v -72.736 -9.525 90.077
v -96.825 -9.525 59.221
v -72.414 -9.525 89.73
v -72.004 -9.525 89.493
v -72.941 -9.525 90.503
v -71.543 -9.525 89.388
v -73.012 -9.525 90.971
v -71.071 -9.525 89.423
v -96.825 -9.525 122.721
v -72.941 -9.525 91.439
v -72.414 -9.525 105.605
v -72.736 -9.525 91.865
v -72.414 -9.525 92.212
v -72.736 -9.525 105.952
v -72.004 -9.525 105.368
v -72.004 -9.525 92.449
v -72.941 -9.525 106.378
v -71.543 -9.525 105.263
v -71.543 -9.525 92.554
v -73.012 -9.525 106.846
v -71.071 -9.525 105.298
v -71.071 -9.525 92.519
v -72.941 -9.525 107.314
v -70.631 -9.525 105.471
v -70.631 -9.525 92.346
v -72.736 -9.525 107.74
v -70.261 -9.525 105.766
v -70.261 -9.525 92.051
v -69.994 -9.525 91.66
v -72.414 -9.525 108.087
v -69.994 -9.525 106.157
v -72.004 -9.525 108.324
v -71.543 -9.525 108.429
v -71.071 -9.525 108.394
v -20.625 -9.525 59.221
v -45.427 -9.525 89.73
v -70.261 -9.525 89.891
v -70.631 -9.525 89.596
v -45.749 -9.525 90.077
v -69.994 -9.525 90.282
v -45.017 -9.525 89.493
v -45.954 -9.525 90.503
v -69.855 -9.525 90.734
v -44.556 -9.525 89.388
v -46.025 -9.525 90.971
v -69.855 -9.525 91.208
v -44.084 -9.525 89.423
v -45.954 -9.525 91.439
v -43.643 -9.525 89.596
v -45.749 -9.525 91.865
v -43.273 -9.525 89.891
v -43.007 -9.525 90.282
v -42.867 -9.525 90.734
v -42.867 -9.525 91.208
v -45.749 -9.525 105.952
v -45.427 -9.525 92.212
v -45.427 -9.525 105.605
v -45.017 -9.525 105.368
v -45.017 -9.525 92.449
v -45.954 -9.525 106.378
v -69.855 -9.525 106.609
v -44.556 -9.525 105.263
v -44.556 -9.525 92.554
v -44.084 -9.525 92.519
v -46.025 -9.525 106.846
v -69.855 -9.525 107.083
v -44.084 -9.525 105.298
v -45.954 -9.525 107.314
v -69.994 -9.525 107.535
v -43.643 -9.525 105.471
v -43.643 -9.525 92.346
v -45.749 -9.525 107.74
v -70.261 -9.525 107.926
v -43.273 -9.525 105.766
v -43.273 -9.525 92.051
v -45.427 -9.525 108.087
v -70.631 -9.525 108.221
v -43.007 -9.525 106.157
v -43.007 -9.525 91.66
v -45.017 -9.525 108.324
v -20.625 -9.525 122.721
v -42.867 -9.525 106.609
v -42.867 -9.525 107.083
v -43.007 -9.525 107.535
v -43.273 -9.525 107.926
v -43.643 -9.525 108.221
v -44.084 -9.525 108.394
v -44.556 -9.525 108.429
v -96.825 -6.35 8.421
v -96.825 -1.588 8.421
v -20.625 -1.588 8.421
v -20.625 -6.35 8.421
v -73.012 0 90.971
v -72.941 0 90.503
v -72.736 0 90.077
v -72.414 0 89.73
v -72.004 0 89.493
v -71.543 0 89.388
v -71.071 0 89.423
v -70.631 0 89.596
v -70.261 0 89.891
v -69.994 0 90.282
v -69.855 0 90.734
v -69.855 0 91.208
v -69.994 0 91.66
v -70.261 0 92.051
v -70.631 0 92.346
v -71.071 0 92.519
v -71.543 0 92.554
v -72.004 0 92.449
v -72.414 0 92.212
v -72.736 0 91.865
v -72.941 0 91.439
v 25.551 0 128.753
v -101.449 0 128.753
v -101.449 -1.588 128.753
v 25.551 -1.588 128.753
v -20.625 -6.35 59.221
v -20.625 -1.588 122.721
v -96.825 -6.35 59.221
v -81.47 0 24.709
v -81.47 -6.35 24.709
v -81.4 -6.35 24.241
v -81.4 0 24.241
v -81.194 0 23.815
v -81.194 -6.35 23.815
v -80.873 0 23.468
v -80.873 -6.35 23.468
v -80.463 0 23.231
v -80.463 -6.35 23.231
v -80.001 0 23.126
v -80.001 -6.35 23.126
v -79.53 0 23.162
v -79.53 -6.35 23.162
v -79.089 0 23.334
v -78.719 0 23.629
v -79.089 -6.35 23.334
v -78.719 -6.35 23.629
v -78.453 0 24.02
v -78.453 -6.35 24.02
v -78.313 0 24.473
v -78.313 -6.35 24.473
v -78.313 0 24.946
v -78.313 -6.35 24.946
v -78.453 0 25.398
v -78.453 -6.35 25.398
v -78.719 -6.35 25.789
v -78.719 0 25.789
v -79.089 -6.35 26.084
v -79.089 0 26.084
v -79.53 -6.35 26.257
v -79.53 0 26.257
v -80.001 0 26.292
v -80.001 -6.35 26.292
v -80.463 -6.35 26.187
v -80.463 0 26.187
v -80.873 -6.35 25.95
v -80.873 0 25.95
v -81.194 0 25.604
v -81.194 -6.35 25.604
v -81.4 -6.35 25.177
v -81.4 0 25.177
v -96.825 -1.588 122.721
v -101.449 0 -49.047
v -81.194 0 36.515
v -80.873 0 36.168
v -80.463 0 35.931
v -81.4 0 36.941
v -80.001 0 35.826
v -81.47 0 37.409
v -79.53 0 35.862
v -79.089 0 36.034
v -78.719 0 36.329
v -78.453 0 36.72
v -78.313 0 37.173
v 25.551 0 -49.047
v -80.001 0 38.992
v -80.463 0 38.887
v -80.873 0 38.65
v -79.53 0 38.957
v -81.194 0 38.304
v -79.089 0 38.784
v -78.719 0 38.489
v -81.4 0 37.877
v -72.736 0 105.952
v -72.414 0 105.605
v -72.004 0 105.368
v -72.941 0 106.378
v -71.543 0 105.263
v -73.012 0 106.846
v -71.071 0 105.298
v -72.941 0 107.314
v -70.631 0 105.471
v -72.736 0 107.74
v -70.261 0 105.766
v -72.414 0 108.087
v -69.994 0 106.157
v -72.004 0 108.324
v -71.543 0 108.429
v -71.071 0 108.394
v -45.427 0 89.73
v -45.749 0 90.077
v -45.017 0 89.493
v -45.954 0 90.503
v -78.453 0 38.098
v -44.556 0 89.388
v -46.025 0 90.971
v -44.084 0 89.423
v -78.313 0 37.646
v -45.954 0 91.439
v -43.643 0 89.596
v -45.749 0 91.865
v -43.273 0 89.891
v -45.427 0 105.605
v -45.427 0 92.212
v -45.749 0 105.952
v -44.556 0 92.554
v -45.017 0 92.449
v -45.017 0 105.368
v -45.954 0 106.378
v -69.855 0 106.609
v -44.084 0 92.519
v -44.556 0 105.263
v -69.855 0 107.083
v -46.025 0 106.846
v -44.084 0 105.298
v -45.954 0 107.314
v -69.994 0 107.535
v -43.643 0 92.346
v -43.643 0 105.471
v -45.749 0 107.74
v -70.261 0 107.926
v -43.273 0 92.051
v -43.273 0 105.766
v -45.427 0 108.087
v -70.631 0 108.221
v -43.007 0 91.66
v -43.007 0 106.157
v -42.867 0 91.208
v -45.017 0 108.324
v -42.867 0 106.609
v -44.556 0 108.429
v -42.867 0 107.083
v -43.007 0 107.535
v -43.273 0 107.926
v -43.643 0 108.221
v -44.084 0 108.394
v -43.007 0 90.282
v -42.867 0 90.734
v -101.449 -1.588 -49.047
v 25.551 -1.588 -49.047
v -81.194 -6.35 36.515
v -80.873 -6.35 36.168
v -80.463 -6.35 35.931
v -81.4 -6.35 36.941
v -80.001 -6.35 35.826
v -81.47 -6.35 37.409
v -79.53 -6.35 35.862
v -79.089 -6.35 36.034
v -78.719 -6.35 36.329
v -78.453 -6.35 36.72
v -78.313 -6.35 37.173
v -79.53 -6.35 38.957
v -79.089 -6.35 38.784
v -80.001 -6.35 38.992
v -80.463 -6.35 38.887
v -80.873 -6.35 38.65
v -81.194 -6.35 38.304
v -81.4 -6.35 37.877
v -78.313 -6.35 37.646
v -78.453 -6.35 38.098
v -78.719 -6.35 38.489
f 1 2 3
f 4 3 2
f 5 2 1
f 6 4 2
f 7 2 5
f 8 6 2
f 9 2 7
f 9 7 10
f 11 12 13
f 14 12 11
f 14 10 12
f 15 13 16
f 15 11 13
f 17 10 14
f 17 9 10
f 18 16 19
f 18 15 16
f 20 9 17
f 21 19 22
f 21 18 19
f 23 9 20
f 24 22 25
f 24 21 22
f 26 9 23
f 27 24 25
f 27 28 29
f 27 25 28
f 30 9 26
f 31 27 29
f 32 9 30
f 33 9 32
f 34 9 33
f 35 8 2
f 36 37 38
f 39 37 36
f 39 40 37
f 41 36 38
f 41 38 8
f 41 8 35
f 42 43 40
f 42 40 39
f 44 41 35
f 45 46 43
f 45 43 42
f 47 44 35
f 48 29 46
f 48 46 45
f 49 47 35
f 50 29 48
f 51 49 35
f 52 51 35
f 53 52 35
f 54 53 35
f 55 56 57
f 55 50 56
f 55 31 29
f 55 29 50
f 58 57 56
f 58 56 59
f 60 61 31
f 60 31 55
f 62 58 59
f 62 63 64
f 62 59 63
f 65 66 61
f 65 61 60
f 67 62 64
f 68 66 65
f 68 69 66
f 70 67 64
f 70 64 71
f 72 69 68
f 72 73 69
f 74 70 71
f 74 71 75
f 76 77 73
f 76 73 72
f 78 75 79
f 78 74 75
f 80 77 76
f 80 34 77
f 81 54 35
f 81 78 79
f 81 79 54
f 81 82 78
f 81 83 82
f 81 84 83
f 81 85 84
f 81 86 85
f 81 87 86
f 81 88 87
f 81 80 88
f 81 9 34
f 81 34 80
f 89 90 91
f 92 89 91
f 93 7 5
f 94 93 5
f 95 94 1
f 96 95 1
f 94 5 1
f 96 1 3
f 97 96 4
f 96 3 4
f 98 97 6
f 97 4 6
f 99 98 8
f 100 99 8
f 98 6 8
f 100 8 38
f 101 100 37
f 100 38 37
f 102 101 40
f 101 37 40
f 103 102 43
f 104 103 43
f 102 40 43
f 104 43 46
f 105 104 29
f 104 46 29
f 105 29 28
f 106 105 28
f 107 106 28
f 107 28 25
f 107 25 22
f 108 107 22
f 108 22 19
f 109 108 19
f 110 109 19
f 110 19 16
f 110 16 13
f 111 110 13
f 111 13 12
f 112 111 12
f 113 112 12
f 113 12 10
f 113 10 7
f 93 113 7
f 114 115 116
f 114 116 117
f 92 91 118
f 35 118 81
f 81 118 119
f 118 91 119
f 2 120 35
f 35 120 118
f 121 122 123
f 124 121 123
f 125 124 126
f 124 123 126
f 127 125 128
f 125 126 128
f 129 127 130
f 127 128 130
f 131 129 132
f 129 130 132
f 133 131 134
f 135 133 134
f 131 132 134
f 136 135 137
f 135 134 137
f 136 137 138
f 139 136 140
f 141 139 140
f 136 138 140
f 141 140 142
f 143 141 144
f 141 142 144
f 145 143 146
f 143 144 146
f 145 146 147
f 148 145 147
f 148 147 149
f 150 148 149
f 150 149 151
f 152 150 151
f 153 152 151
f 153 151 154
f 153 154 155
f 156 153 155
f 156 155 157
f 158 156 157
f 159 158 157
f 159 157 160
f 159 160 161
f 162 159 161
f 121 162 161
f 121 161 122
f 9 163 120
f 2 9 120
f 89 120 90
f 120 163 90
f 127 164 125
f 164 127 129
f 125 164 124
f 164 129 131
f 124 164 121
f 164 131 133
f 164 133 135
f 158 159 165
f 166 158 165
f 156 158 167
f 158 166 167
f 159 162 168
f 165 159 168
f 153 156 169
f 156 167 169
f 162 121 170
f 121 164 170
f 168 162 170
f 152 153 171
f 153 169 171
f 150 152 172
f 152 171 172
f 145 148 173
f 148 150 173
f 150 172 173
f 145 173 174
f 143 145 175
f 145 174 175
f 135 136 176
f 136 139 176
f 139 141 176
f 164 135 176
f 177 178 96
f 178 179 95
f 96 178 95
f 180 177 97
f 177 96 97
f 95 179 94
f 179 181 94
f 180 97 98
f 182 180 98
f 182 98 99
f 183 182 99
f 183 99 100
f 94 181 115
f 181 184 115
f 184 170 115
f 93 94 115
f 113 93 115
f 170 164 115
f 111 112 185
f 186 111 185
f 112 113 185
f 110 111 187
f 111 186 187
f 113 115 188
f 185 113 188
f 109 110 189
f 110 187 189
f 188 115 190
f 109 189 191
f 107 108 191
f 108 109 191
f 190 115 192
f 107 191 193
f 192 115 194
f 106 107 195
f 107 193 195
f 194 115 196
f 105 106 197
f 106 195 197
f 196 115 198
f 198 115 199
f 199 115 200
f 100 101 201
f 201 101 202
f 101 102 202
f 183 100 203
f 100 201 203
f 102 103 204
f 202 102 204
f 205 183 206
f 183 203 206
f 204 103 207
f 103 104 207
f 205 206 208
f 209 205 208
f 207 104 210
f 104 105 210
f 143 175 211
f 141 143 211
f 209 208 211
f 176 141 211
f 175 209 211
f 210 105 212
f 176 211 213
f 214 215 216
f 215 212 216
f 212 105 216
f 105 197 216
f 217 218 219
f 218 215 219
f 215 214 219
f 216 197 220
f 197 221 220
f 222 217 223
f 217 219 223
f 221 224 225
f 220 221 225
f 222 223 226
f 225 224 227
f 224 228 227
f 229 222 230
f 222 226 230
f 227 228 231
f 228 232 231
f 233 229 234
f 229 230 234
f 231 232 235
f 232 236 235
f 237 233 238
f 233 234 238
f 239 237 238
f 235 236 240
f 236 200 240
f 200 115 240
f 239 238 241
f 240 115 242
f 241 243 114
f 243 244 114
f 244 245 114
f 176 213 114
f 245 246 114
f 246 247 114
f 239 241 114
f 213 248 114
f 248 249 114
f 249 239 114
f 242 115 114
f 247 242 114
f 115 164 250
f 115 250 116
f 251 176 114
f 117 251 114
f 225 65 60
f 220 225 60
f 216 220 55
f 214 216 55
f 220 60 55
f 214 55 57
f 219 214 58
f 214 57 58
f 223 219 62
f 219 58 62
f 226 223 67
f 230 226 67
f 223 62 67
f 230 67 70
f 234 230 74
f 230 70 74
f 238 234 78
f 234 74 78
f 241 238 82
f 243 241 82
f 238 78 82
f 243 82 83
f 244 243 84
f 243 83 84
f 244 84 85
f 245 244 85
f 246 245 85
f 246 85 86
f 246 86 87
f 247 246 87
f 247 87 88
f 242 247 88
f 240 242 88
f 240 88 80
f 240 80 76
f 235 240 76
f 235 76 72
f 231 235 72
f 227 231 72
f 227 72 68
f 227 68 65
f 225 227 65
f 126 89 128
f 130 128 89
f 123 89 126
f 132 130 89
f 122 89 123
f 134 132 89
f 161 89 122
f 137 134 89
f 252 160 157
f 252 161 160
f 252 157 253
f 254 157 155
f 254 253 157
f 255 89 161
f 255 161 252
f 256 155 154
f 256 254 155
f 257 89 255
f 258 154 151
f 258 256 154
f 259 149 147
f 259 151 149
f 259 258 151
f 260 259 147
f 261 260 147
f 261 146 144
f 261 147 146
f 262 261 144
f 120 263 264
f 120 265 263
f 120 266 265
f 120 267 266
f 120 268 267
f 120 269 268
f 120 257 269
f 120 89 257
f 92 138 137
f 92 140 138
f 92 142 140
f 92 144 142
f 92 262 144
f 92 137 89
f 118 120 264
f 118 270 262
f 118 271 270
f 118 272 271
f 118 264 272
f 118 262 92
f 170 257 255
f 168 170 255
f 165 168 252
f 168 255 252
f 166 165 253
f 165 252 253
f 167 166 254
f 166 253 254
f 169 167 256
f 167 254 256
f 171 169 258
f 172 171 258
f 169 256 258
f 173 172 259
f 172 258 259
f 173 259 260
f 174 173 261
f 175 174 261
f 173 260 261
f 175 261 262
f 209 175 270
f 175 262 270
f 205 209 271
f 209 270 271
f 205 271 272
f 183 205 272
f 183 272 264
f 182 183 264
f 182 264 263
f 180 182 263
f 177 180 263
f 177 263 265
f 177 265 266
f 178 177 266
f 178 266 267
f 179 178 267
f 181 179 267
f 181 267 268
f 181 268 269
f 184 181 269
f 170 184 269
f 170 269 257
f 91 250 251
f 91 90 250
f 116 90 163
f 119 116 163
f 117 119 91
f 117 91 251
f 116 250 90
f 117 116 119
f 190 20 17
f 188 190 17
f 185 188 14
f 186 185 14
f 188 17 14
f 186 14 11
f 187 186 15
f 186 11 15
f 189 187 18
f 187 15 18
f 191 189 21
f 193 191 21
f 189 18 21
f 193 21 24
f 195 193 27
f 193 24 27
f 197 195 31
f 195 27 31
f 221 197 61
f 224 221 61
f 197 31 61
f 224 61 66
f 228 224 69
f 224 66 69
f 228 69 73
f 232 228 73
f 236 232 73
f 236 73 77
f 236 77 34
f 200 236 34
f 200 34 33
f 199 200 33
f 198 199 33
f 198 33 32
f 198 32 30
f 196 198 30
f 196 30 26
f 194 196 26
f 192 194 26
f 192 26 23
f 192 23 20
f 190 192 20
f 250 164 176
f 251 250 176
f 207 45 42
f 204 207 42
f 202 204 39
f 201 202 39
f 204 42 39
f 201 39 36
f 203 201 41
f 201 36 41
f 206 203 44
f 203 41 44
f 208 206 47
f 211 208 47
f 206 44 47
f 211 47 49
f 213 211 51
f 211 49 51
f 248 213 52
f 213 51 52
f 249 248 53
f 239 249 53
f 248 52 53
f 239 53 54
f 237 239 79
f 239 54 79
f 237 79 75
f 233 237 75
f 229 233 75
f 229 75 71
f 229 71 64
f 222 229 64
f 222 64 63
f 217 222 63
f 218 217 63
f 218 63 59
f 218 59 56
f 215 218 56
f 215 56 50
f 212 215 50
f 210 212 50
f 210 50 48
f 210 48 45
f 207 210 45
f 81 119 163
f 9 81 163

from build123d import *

# Parameters (mm, degrees)
F0_W     = 127
F0_H     = 177.8
F1_DEPTH = 1.5875
F2_DEPTH = 9.525
F3_DEPTH = 6.35
F4_D     = 3.175


with BuildPart() as f1:
    # F0 (on Front) → F1 (new body)
    with BuildSketch(Plane.XZ):
        with Locations((-37.948684603, 39.8532302618)):
            Rectangle(F0_W, F0_H)
        Polygon((-96.8245146513, 59.2209026217), (-96.8245146513, 122.7209026217), (-20.6245146513, 122.7209026217), (-20.6245146513, 59.2209026217), (-20.6245146513, 8.4209026217), (-96.8245146513, 8.4209026217), align=None, mode=Mode.SUBTRACT)
    extrude(amount=F1_DEPTH)

    # F0 (on Front) → F2 (join)
    with BuildSketch(Plane.XZ):
        Polygon((-20.6245146513, 122.7209026217), (-96.8245146513, 122.7209026217), (-96.8245146513, 59.2209026217), (-58.7245146513, 59.2209026217), (-20.6245146513, 59.2209026217), align=None)
    extrude(amount=F2_DEPTH)

    # F0 (on Front) → F3 (join)
    with BuildSketch(Plane.XZ):
        Polygon((-58.7245146513, 59.2209026217), (-96.8245146513, 59.2209026217), (-96.8245146513, 8.4209026217), (-20.6245146513, 8.4209026217), (-20.6245146513, 59.2209026217), align=None)
        Polygon((-85.7120146513, 43.1527666092), (-58.7245146513, 43.1527666092), (-31.7370146513, 43.1527666092), (-31.7370146513, 17.7527666092), (-85.7120146513, 17.7527666092), align=None, mode=Mode.SUBTRACT)
        Polygon((-31.7370146513, 43.1527666092), (-58.7245146513, 43.1527666092), (-85.7120146513, 43.1527666092), (-85.7120146513, 17.7527666092), (-31.7370146513, 17.7527666092), align=None)
    extrude(amount=F3_DEPTH)

    # F4 (through all)
    with Locations(Plane(origin=(0, 0, 0), x_dir=(1, 0, 0), z_dir=(0, 1, 0))):
        with Locations((-71.4245146513, -106.8459026217), (-44.4370146513, -106.8459026217), (-44.4370146513, -90.9709026217), (-71.4245146513, -90.9709026217), (-79.8828303814, -37.4092385173), (-79.8828303814, -24.7092385173)):
            Hole(F4_D / 2)


solid = f1.part
